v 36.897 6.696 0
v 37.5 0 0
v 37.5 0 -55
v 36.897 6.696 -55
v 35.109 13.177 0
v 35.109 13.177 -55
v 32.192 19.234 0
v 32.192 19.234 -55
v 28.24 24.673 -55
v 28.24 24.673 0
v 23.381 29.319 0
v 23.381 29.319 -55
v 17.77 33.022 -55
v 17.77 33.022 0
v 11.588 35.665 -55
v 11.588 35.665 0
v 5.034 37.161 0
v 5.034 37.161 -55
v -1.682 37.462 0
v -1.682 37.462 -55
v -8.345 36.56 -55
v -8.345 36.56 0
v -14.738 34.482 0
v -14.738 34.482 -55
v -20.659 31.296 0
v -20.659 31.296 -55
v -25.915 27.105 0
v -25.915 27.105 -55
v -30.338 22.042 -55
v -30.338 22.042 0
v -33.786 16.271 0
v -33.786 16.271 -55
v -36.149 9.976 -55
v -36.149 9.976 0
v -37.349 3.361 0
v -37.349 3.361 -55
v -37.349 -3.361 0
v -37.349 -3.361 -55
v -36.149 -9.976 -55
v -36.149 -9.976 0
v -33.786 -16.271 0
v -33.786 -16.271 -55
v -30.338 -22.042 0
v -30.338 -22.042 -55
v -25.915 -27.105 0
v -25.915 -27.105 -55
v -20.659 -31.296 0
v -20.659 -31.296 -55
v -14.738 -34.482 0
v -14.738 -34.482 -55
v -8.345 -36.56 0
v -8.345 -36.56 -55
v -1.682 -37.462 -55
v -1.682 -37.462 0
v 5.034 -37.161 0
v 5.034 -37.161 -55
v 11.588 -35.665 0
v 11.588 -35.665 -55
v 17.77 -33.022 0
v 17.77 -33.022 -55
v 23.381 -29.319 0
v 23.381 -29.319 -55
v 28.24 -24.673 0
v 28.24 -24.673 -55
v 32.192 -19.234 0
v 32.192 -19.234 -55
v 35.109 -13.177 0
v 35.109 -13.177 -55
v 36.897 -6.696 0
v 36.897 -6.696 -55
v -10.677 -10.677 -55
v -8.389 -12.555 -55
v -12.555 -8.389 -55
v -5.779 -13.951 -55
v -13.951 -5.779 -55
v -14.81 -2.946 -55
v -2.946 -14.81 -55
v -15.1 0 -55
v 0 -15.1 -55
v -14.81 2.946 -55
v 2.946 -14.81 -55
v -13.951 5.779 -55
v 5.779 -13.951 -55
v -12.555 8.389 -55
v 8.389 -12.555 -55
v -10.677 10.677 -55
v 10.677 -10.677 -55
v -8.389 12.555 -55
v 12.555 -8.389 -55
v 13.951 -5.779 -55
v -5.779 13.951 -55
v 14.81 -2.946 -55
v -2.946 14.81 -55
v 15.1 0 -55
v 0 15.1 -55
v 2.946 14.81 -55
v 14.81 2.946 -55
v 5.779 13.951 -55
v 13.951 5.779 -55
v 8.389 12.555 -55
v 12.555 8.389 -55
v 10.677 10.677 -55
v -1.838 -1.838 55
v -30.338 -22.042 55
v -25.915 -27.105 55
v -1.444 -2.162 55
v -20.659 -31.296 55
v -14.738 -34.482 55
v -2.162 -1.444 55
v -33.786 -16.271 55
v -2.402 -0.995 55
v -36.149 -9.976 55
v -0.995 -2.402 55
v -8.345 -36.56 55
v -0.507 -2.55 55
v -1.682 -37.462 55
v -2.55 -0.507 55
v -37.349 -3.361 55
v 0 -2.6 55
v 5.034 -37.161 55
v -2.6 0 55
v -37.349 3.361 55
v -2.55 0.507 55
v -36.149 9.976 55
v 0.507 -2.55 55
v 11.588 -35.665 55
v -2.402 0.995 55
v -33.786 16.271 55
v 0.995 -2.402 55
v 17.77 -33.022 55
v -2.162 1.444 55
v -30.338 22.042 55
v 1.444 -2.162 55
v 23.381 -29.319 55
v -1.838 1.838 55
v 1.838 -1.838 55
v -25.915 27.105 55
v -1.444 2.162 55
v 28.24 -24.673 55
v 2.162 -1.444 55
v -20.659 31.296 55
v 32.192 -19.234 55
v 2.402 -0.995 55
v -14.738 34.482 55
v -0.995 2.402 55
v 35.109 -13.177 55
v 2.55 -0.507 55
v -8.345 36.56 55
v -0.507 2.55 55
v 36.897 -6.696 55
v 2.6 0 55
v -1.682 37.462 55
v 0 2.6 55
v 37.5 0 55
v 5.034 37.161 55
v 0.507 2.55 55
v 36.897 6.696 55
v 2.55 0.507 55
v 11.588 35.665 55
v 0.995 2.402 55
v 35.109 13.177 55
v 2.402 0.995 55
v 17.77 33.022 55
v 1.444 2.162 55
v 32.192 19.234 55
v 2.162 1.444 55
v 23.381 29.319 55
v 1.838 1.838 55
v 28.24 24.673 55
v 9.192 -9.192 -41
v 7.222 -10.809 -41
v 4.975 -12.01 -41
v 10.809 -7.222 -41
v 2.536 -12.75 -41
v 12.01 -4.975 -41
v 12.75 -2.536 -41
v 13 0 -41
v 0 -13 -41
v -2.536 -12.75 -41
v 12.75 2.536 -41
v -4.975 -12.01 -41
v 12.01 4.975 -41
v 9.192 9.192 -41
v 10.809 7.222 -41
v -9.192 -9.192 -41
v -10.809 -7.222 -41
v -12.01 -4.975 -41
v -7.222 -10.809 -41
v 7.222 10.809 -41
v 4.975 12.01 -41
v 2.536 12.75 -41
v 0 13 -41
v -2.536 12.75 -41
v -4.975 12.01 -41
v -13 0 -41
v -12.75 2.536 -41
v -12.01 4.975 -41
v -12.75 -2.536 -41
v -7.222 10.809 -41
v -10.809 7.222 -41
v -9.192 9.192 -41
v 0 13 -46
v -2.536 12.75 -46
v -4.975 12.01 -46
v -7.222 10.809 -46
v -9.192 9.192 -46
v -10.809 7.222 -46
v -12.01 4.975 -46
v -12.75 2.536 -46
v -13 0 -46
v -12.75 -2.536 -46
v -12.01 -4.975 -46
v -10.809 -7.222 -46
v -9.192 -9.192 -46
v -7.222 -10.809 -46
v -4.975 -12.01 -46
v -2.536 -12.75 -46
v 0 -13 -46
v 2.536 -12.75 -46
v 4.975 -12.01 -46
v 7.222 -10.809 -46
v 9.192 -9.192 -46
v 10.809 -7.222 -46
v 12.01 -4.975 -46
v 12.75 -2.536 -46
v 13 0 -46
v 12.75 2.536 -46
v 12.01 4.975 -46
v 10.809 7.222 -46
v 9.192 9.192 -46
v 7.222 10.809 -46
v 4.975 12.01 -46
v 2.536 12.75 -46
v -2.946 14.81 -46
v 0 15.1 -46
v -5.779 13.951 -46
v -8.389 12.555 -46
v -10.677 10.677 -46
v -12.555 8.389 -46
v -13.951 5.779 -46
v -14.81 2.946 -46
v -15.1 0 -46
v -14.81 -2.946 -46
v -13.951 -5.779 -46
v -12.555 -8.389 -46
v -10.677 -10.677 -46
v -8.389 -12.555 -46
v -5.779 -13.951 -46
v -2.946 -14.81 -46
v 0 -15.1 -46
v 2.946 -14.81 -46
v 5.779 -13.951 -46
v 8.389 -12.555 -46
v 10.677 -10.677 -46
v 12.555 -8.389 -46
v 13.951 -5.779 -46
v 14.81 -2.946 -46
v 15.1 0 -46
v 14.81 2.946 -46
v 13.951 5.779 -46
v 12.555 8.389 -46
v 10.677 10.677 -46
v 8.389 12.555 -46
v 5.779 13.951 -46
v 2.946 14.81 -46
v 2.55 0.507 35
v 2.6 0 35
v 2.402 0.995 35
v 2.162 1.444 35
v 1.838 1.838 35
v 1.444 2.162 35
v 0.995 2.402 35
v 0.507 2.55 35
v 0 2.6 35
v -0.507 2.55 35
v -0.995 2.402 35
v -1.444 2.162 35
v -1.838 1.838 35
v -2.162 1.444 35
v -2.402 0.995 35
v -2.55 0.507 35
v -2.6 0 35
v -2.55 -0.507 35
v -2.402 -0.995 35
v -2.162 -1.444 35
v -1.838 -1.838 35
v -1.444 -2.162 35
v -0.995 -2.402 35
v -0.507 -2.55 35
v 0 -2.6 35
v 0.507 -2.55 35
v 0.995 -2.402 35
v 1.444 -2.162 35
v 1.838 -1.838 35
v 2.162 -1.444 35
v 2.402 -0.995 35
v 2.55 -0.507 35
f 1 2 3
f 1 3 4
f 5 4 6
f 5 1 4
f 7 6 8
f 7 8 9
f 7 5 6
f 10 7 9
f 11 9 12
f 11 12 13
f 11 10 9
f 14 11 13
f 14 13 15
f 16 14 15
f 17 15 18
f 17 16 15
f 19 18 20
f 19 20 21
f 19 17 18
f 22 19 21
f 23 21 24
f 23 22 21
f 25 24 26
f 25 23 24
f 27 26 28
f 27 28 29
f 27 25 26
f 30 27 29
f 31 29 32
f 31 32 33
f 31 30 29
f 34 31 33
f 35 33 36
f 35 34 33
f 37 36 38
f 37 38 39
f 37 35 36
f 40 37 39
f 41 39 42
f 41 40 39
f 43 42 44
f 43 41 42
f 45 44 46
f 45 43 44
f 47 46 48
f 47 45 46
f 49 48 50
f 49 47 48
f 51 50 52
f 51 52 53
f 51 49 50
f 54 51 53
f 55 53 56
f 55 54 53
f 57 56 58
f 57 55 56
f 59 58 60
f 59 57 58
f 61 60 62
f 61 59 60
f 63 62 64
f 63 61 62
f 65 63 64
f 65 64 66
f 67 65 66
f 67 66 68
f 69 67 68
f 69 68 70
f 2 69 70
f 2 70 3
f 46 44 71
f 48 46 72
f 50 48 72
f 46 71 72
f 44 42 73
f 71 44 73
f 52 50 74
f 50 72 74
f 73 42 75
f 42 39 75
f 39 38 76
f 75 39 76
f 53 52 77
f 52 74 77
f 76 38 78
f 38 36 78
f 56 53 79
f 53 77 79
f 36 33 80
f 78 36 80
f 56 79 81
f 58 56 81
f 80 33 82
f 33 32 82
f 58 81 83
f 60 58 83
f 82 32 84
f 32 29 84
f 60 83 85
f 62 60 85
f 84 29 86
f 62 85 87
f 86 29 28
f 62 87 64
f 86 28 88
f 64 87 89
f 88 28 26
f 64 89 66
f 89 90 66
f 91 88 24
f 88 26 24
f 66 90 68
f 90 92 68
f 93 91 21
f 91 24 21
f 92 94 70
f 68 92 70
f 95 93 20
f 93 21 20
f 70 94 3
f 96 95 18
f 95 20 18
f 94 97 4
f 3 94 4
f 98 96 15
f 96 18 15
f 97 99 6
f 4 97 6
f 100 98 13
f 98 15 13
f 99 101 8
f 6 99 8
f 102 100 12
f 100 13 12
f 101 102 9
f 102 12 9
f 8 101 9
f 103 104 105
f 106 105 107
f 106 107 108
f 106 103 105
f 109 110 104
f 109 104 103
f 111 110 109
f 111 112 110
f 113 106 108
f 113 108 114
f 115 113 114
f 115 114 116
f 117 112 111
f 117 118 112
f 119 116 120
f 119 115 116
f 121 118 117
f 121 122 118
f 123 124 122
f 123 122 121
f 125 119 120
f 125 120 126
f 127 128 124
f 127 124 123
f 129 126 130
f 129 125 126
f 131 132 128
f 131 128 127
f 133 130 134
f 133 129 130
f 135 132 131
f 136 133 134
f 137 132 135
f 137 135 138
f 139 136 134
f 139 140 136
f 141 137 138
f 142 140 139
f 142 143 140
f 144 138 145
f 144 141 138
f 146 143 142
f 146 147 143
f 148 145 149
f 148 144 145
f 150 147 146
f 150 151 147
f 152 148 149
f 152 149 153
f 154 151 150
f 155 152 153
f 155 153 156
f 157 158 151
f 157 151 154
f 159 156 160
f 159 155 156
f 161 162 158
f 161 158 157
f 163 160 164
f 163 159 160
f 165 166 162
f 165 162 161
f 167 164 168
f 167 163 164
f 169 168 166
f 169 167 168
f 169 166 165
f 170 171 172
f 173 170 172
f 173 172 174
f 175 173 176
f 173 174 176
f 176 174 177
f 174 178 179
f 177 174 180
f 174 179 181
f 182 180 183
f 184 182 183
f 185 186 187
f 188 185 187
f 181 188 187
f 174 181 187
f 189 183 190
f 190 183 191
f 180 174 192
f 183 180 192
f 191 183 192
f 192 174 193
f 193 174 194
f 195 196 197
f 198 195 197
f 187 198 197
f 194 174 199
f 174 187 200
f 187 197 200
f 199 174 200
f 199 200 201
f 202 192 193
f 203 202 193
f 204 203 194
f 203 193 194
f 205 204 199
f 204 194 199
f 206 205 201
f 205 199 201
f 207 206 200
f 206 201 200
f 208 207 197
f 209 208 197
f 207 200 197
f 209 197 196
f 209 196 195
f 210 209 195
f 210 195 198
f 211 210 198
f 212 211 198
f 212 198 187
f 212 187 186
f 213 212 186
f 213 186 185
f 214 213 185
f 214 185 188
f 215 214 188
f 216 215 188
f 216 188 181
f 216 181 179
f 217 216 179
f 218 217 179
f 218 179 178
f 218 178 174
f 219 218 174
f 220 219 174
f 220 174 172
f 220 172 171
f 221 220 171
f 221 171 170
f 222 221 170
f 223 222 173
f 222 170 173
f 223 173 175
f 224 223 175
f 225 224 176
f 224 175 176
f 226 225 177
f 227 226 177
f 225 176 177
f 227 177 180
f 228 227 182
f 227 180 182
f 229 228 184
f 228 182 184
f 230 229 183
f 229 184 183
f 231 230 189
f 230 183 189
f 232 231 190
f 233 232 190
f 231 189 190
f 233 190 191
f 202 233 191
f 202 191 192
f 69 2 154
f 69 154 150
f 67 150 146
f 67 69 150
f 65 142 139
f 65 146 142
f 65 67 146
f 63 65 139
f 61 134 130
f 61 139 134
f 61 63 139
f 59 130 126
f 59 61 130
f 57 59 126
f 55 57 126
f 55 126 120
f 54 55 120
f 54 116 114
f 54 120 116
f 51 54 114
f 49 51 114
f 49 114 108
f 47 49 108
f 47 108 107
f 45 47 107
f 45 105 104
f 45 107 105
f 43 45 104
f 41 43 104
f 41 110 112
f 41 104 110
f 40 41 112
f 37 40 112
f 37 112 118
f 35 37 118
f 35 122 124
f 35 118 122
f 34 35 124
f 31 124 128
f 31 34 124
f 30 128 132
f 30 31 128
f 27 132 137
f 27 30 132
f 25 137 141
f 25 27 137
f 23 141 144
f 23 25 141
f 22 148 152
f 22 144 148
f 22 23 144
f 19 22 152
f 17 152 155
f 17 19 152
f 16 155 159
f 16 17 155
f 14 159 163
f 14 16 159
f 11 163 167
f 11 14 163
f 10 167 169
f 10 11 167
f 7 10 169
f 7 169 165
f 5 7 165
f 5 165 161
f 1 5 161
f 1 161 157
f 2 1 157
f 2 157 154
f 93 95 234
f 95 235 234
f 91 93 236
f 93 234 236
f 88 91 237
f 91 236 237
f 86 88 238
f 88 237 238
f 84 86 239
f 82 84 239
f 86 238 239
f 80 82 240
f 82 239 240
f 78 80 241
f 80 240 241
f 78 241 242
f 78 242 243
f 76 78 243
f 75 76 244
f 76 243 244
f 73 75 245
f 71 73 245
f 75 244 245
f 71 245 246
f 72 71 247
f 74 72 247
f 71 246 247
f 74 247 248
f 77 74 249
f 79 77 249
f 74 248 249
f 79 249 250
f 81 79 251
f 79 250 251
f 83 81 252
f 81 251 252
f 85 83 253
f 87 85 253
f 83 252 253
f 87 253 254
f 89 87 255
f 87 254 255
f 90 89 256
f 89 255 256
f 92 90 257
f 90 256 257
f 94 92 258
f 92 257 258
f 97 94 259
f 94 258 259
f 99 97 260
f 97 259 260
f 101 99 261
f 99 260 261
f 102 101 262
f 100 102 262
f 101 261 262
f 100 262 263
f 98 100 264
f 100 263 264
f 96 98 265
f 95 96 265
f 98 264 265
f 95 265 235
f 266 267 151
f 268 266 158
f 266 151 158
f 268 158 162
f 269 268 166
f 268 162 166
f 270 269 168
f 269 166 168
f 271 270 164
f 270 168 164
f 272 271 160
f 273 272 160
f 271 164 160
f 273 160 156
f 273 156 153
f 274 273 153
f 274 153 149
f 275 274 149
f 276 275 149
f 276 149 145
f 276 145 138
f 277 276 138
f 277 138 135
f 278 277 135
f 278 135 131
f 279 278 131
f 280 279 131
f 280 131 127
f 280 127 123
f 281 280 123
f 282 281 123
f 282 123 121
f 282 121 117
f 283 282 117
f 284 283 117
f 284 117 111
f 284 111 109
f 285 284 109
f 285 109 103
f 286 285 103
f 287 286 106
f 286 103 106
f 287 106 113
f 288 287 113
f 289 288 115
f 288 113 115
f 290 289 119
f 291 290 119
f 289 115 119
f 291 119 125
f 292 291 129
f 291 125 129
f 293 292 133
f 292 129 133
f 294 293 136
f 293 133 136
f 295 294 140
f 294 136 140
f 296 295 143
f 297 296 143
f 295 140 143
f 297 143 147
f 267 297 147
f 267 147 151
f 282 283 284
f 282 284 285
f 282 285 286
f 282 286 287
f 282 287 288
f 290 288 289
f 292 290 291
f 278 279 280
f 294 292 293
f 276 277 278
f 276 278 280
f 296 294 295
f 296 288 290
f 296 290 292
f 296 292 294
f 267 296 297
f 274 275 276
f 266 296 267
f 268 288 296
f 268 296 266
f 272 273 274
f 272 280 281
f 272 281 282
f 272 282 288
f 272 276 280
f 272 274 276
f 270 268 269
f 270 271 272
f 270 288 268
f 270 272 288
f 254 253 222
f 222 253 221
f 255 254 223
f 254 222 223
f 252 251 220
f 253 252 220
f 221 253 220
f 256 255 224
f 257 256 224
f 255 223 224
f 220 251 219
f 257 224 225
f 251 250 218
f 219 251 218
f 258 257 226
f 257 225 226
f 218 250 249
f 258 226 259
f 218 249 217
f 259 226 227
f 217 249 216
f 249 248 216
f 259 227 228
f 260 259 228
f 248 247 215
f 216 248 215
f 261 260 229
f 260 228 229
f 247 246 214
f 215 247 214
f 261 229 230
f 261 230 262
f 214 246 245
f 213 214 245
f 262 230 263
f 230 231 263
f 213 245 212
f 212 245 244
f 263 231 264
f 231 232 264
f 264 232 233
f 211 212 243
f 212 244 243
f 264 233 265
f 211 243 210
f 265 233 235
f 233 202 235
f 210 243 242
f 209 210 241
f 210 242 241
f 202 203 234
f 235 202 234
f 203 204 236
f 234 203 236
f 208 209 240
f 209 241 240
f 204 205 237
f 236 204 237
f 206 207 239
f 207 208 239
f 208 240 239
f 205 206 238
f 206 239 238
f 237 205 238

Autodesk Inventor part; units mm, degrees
ref_plane "YZ Plane" through (0, 0, 0) normal (1, 0, 0) x (0, 1, 0)
ref_plane "XZ Plane" through (0, 0, 0) normal (0, 1, 0) x (-1, 0, 0)
ref_plane "XY Plane" through (0, 0, 0) normal (0, 0, 1) x (1, 0, 0)
sketch "Sketch1" plane through (0, 0, 0) normal (0, 0, 1) x (1, 0, 0)
  circle A0 centre (0, 0) radius 37.5
  dimension "d0" = 75
extrude "Extrusion1" add sketch "Sketch1" along normal mid plane 110
sketch "Sketch4" plane through (0, 0, -55) normal (0, 0, -1) x (-1, 0, 0)
  point P0 (0, 0)
  point P1 (0, 0)
hole "Hole1" at (0, 0, -55) direction (0, 0, 1) diameter 26 depth 14 counterbore diameter 30.2 counterbore depth 9
sketch "Sketch5" plane through (0, 0, 55) normal (0, 0, 1) x (1, 0, 0)
  circle A0 centre (0, 0) radius 2.6
  dimension "d22" = 5.2
extrude "Extrusion4" cut sketch "Sketch5" against normal blind 20
properties part number "13042026-11"
